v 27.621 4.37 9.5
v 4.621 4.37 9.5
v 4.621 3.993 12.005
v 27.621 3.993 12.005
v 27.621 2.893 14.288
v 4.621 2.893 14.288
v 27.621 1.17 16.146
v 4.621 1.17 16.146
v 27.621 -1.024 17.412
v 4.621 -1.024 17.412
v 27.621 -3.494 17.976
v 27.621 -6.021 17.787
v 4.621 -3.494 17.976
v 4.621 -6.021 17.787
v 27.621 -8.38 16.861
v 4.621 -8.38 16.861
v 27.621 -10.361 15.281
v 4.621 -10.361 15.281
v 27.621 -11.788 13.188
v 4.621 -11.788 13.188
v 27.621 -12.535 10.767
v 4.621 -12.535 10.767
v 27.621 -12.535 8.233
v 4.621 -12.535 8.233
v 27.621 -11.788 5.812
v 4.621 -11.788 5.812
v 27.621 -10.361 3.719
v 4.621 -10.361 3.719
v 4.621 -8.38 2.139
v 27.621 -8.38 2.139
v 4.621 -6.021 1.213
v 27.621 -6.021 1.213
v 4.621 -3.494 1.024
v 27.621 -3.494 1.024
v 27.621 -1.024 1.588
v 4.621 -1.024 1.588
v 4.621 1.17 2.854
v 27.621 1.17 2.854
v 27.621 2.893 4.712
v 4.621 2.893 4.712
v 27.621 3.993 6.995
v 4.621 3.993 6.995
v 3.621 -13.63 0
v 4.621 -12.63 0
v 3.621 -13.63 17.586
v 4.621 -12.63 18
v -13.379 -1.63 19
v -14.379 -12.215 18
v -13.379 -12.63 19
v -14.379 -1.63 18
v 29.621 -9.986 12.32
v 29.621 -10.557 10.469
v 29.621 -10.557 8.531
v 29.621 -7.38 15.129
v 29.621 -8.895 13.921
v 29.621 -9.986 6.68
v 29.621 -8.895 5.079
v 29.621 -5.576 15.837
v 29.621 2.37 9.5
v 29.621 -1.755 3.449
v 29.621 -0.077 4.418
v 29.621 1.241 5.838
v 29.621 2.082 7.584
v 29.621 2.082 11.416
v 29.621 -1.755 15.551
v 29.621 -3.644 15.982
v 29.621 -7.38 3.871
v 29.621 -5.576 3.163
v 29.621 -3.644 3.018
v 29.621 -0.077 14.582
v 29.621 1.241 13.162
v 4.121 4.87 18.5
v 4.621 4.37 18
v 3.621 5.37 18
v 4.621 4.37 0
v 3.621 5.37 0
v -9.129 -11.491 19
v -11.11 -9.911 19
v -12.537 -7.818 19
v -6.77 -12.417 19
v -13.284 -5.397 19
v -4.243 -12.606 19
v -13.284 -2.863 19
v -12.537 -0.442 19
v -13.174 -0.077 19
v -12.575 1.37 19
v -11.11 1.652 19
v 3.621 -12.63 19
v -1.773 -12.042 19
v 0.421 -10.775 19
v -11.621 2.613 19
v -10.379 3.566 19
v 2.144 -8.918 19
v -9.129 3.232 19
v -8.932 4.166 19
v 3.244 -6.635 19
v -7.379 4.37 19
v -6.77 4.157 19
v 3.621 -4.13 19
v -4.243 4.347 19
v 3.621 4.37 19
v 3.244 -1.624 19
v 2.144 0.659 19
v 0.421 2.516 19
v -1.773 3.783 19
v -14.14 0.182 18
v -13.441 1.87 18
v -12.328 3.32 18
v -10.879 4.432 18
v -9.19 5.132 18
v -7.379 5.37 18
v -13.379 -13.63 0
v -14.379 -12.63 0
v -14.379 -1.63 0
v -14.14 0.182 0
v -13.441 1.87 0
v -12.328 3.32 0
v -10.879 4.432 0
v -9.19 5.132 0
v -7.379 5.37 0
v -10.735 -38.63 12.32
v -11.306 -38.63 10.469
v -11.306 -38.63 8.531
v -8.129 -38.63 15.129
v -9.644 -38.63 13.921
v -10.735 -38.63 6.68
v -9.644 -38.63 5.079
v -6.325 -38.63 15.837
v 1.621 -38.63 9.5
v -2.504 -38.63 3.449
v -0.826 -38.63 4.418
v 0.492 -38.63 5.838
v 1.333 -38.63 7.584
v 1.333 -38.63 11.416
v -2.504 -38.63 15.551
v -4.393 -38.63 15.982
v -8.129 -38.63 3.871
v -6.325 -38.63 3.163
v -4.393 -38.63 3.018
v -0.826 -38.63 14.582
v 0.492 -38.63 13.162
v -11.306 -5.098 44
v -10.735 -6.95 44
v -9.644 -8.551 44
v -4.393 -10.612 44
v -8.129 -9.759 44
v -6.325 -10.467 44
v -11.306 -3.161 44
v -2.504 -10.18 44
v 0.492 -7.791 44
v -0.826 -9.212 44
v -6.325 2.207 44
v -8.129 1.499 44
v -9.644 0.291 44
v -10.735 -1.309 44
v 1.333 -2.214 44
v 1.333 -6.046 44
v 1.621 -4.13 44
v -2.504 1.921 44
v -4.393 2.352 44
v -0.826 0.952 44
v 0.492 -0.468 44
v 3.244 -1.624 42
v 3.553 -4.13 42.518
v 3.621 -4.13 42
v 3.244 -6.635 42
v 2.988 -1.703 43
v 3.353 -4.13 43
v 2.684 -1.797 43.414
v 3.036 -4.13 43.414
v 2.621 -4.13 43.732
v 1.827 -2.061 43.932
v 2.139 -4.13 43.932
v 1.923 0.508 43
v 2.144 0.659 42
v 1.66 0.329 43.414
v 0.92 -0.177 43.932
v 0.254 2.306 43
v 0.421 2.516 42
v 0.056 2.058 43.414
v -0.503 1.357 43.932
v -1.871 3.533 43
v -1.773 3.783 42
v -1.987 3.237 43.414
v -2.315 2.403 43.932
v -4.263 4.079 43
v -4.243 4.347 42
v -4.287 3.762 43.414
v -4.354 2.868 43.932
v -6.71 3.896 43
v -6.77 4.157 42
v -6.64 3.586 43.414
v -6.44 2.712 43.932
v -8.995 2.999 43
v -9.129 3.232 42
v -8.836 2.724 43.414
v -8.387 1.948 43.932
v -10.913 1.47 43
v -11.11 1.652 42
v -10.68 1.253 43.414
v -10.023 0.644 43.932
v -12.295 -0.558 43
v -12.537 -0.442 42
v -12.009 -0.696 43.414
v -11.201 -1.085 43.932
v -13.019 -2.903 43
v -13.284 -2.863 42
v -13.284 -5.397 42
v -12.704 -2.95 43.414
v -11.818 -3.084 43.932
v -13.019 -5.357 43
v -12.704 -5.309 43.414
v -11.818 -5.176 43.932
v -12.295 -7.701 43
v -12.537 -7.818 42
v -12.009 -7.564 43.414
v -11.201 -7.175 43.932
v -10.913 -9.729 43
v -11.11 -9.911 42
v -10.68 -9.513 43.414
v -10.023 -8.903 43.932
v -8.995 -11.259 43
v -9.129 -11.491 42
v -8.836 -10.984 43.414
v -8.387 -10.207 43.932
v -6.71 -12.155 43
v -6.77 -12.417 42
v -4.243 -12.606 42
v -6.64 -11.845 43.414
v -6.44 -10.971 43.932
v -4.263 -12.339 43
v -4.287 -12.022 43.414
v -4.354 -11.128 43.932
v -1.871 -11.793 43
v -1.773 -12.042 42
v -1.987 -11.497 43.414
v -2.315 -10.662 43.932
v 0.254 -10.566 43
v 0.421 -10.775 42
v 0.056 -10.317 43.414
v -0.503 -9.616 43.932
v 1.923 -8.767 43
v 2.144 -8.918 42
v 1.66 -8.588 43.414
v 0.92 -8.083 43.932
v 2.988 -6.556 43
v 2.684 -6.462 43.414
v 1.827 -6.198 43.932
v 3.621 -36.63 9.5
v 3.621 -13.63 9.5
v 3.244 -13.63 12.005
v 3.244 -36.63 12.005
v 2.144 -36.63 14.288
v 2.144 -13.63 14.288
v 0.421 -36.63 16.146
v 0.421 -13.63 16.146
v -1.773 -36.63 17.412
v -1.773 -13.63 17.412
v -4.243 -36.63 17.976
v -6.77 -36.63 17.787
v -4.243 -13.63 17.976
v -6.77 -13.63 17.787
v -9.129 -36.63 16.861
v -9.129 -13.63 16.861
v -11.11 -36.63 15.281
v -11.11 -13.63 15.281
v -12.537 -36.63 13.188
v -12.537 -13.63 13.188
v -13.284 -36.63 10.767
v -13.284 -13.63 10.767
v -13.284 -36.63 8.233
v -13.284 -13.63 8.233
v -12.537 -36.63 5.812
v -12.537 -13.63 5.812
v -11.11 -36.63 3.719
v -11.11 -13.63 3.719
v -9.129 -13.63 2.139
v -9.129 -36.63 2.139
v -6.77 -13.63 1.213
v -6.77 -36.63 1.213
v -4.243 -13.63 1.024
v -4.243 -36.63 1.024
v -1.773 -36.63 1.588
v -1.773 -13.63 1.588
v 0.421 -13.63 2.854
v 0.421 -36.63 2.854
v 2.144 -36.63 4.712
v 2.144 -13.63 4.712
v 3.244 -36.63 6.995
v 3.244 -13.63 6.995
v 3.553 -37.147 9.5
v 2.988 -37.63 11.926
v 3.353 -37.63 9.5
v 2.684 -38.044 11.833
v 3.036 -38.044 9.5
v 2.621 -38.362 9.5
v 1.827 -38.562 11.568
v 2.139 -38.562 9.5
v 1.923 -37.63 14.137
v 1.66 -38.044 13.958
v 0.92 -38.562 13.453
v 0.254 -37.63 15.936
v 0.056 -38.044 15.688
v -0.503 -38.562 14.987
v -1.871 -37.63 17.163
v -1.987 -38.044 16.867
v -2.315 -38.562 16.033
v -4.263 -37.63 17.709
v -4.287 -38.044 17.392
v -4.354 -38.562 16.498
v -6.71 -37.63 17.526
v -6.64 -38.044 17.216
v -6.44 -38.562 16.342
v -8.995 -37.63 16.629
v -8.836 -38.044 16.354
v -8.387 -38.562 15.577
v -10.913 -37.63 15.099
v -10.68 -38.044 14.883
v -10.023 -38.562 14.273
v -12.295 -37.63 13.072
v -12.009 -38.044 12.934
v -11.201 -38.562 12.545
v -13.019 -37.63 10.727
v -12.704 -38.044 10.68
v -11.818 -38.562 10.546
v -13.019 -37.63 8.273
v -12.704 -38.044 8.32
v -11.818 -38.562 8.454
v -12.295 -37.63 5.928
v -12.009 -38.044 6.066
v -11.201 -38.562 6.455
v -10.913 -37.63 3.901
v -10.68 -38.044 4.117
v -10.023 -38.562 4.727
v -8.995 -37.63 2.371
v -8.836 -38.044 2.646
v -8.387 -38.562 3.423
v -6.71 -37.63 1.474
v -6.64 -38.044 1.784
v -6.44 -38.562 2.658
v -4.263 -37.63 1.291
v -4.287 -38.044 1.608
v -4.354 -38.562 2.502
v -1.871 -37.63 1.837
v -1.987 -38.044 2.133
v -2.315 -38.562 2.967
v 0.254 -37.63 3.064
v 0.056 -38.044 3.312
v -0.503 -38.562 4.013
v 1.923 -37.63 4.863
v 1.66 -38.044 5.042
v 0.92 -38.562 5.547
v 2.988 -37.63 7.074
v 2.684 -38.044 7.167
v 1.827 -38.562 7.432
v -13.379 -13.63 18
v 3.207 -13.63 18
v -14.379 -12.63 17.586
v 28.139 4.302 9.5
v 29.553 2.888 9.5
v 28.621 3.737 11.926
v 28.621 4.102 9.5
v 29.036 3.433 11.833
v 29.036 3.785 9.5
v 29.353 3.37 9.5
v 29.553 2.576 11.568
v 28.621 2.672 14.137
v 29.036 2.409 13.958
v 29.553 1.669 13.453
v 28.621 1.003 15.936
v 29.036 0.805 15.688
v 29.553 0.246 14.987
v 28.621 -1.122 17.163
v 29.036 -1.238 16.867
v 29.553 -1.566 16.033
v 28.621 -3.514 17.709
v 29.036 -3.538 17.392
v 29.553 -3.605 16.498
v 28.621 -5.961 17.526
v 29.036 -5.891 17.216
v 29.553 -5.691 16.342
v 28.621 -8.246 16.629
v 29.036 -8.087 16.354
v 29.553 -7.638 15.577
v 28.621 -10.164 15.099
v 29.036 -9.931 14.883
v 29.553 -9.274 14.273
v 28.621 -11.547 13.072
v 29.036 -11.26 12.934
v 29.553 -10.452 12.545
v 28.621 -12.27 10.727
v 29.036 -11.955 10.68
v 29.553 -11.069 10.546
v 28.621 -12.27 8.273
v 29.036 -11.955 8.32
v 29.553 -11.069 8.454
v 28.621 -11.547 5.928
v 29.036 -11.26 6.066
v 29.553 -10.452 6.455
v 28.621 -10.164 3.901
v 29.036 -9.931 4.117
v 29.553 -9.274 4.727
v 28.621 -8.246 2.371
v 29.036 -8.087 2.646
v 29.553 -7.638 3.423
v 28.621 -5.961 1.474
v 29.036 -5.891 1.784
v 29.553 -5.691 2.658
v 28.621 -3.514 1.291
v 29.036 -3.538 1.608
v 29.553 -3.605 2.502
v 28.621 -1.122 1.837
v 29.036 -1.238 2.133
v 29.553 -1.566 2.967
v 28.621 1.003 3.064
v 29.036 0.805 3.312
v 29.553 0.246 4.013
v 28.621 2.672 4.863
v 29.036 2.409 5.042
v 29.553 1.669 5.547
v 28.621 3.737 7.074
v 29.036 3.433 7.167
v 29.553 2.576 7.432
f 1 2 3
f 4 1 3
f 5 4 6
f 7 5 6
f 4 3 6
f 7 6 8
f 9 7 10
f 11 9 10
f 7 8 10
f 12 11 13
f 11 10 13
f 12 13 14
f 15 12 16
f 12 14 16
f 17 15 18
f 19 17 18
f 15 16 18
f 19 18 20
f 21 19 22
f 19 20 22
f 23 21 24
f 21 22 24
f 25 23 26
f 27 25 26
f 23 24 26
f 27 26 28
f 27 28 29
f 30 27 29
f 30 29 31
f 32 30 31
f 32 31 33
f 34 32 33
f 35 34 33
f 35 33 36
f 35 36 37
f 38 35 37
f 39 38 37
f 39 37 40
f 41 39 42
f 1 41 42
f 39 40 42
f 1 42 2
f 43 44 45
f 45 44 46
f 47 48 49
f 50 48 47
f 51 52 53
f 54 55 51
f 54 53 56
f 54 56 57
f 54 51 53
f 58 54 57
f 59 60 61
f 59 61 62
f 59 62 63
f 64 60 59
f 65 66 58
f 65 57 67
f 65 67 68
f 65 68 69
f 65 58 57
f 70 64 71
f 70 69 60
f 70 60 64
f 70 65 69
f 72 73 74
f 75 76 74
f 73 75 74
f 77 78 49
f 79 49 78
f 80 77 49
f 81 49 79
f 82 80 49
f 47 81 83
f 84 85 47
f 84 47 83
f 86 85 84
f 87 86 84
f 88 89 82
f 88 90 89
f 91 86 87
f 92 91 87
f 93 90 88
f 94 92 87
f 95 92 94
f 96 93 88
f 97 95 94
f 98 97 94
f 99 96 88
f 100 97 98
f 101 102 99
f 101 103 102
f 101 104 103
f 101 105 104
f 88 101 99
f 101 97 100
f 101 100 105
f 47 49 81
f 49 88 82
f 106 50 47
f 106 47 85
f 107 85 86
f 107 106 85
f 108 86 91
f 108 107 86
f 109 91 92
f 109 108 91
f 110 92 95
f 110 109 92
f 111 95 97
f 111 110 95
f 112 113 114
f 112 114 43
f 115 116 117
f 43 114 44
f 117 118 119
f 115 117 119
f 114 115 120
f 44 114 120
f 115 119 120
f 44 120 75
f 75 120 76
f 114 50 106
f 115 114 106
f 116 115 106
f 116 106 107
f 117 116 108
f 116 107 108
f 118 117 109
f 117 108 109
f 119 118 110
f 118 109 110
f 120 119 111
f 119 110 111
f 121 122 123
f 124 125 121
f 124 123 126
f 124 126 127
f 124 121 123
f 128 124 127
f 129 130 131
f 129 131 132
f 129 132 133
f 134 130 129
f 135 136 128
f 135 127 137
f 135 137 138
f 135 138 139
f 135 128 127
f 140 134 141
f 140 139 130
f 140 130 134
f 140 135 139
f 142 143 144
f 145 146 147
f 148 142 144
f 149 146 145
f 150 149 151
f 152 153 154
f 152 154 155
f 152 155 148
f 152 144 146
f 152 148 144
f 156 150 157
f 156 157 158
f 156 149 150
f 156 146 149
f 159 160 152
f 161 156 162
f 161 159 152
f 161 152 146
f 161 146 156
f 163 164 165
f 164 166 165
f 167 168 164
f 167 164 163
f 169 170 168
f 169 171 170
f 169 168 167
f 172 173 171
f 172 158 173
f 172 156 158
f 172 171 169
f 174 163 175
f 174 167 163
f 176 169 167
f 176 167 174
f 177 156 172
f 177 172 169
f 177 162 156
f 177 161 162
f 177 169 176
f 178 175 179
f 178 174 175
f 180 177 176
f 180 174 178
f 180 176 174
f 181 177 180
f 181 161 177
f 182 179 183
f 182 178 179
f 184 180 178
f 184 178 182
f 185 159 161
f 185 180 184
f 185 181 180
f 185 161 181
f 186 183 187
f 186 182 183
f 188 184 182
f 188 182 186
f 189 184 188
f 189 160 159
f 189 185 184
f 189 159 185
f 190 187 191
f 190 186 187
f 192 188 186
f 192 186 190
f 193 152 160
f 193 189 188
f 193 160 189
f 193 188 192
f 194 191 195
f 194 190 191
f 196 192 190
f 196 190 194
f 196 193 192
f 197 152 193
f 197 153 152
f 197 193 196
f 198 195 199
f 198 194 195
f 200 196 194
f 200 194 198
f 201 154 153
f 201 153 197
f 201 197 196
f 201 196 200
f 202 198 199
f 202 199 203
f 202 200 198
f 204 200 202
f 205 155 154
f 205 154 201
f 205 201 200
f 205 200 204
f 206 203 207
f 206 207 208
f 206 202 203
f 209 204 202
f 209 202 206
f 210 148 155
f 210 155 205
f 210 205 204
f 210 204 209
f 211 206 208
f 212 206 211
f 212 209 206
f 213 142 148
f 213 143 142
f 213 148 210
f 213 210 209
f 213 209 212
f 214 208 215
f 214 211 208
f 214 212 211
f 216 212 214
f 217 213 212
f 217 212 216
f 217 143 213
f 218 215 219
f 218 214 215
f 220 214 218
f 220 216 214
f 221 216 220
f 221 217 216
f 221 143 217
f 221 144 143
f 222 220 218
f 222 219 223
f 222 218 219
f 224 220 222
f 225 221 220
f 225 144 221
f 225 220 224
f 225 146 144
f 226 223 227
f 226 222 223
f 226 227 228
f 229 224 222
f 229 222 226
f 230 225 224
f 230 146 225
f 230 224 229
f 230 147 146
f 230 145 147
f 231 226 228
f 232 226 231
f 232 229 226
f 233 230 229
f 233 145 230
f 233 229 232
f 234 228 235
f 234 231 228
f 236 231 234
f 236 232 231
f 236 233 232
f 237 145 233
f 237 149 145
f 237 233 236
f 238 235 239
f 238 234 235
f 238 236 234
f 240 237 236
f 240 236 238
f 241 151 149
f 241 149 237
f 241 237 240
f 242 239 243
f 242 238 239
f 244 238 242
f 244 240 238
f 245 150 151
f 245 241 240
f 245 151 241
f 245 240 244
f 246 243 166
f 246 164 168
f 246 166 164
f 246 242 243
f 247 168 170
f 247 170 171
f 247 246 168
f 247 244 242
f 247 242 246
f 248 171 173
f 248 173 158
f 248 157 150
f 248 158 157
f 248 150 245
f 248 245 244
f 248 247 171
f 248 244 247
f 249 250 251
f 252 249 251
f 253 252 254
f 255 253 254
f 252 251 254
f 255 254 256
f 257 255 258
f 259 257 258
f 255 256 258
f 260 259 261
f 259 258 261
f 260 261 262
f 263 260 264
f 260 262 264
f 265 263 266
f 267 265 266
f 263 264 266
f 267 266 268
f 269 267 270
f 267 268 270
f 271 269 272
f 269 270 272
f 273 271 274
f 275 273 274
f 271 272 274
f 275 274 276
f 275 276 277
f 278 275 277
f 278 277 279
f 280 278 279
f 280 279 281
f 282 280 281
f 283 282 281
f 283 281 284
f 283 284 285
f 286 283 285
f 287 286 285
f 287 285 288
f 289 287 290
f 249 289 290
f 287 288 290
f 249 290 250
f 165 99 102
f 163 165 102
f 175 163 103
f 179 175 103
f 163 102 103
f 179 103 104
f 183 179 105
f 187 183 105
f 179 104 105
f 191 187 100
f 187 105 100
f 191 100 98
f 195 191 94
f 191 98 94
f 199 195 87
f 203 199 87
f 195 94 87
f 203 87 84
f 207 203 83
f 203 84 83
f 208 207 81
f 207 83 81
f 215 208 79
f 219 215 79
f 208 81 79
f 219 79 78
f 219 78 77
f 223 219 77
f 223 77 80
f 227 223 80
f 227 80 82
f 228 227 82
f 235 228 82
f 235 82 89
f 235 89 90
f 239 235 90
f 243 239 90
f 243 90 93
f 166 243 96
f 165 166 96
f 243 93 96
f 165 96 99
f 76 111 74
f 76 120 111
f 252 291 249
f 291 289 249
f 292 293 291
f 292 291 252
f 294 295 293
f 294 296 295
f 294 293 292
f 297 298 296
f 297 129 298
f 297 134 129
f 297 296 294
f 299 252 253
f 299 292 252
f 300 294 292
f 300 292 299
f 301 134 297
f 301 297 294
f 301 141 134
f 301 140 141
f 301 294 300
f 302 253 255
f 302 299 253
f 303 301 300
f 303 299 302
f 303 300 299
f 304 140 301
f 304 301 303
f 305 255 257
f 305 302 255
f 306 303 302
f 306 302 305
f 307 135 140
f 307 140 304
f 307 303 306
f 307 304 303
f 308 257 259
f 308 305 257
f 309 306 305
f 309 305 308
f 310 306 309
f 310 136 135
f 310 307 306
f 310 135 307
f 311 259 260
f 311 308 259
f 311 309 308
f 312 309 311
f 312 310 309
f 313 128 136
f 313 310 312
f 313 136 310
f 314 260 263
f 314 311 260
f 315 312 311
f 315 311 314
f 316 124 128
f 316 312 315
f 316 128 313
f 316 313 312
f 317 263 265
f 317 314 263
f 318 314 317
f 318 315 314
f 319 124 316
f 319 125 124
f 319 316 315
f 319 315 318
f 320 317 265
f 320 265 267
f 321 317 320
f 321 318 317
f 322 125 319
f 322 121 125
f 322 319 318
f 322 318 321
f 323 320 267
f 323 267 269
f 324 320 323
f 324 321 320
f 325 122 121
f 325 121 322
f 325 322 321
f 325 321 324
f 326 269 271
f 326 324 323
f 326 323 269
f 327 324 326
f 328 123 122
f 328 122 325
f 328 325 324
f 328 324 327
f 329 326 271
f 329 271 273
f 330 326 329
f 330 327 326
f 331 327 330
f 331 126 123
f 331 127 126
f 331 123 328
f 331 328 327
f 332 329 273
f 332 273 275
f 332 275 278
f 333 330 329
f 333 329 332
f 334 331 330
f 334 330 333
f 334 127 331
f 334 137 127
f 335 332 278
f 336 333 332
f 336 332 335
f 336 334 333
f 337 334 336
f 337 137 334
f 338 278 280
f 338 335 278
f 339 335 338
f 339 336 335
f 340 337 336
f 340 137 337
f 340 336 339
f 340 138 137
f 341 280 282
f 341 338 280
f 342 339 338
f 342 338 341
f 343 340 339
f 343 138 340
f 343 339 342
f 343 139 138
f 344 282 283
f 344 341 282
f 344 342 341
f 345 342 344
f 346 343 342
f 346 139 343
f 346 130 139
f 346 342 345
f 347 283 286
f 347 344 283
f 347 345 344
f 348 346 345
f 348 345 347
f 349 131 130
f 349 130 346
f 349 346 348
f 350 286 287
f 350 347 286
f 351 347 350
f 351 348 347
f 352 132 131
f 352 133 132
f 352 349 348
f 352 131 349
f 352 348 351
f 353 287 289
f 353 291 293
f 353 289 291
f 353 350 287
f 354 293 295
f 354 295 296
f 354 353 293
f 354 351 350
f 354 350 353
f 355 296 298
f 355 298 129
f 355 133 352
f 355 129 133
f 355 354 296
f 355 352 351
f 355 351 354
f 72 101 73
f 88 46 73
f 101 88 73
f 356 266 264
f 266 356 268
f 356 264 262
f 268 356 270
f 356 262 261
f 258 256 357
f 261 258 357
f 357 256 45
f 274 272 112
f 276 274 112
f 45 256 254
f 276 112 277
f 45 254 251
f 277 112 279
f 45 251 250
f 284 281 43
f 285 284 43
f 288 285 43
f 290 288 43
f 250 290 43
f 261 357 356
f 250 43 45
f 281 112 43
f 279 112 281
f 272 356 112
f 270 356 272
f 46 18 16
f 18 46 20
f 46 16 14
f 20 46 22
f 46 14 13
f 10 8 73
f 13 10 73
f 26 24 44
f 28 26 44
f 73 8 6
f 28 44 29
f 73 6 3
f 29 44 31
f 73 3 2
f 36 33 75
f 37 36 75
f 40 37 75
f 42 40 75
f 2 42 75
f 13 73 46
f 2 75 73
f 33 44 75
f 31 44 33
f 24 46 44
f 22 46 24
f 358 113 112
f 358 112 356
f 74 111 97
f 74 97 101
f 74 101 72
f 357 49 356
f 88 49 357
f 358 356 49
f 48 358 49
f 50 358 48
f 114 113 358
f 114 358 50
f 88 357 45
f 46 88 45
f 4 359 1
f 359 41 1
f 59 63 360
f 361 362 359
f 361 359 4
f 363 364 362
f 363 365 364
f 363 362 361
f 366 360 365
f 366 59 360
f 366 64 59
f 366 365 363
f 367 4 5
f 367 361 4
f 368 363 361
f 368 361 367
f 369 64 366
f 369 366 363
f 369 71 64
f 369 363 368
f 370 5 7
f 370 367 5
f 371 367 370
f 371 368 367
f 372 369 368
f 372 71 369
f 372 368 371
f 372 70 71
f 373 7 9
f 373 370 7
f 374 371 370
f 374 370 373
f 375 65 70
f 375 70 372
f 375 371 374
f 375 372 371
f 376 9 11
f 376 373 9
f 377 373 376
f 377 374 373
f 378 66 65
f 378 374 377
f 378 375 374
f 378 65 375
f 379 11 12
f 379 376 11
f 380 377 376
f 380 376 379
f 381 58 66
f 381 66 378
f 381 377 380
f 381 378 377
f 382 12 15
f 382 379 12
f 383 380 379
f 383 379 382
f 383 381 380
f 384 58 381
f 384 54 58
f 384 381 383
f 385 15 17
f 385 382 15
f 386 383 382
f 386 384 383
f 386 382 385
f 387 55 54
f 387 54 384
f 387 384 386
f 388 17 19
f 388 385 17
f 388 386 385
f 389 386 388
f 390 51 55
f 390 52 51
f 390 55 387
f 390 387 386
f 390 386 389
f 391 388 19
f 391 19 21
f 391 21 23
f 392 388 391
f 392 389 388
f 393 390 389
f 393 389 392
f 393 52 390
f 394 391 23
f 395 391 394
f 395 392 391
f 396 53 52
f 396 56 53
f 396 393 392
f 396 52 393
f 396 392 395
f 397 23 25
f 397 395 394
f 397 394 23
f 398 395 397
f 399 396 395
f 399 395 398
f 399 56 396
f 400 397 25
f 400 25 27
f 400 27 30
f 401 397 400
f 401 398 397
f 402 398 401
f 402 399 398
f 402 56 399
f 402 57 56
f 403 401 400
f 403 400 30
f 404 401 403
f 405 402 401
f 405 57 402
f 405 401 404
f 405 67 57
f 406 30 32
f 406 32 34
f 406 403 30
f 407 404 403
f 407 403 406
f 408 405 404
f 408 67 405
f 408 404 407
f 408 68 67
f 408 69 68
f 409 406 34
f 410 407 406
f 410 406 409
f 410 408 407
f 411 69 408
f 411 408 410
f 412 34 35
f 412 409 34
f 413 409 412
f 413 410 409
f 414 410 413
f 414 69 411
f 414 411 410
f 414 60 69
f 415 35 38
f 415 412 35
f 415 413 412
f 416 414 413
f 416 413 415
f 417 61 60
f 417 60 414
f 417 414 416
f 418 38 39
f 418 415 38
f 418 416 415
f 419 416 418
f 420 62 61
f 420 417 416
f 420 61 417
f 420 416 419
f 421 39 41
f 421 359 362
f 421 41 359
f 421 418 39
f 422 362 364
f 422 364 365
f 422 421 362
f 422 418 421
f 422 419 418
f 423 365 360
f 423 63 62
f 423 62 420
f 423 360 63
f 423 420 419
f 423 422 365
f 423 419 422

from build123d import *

# Parameters (mm, degrees)
F0_W     = 19
F0_H     = 19
F1_DEPTH = 19
F2_R     = 8.5
F5_DEPTH = 25
F3_R     = 8.5
F6_DEPTH = 25
F4_R     = 8.5
F7_DEPTH = 25
F8_R     = 2
F9_R     = 7
F10_SIZE = 0.99999
F11_SIZE = 0.99999
F12_SIZE = 0.99999


# Not quite as in the source:
# - a fillet or chamfer is up to 0.001 mm smaller than in the source, because OpenCascade refuses the exact size


with BuildPart() as f1:
    # F0 (on Top) → F1 (new body)
    with BuildSketch(Plane.XY):
        with Locations((-4.8786746205, -4.1296786368)):
            Rectangle(F0_W, F0_H)
    extrude(amount=F1_DEPTH)

    # F2 (on face) → F5 (join)
    with BuildSketch(Plane.XZ.offset(13.6296786368)):
        with Locations((-4.8786746205, 9.5)):
            Circle(F2_R)
    extrude(amount=F5_DEPTH)

    # F3 (on face) → F6 (join)
    with BuildSketch(Plane.YZ.offset(4.6213253795)):
        with Locations((-4.1296786368, 9.5)):
            Circle(F3_R)
    extrude(amount=F6_DEPTH)

    # F4 (on face) → F7 (join)
    with BuildSketch(Plane.XY.offset(19)):
        with Locations((-4.8786746205, -4.1296786368)):
            Circle(F4_R)
    extrude(amount=F7_DEPTH)

    # F8
    f8_edges = [f1.edges().sort_by_distance(p)[0] for p in [
        (-13.378675, -38.629679, 9.5),
        (29.621325, -12.629679, 9.5),
        (-13.378675, -4.129679, 44),
    ]]
    fillet(f8_edges, radius=F8_R)

    # F9
    f9_edges = [f1.edges().sort_by_distance(p)[0] for p in [
        (-14.378675, 5.370321, 9.5),
    ]]
    fillet(f9_edges, radius=F9_R)

    # F10 (size 1 in the source; OpenCascade refuses exactly that, so slightly less here)
    f10_edges = [f1.edges().sort_by_distance(p)[0] for p in [
        (4.621325, -4.129679, 19),
    ]]
    chamfer(f10_edges, length=F10_SIZE)

    # F11 (size 1 in the source; OpenCascade refuses exactly that, so slightly less here)
    f11_edges = [f1.edges().sort_by_distance(p)[0] for p in [
        (4.621325, -13.629679, 9.000005),
        (4.12133, -13.629679, 18.500005),
        (-5.37867, -13.629679, 19),
    ]]
    chamfer(f11_edges, length=F11_SIZE)

    # F12 (call 1 of 2: OpenCascade refuses the feature's edges together) (size 1 in the source; OpenCascade refuses exactly that, so slightly less here)
    f12_edges = [f1.edges().sort_by_distance(p)[0] for p in [
        (-1.87867, 5.370321, 19),
        (-12.328422, 3.320069, 19),
        (-14.378675, -7.129684, 19),
        (-14.378675, -13.629679, 9.000005),
        (-14.378675, -13.129684, 18.500005),
    ]]
    chamfer(f12_edges, length=F12_SIZE)

    # F12#2 (call 2 of 2) (size 1 in the source; OpenCascade refuses exactly that, so slightly less here)
    f12_2_edges = [f1.edges().sort_by_distance(p)[0] for p in [
        (4.621325, 5.370321, 9.000005),
    ]]
    chamfer(f12_2_edges, length=F12_SIZE)


solid = f1.part
